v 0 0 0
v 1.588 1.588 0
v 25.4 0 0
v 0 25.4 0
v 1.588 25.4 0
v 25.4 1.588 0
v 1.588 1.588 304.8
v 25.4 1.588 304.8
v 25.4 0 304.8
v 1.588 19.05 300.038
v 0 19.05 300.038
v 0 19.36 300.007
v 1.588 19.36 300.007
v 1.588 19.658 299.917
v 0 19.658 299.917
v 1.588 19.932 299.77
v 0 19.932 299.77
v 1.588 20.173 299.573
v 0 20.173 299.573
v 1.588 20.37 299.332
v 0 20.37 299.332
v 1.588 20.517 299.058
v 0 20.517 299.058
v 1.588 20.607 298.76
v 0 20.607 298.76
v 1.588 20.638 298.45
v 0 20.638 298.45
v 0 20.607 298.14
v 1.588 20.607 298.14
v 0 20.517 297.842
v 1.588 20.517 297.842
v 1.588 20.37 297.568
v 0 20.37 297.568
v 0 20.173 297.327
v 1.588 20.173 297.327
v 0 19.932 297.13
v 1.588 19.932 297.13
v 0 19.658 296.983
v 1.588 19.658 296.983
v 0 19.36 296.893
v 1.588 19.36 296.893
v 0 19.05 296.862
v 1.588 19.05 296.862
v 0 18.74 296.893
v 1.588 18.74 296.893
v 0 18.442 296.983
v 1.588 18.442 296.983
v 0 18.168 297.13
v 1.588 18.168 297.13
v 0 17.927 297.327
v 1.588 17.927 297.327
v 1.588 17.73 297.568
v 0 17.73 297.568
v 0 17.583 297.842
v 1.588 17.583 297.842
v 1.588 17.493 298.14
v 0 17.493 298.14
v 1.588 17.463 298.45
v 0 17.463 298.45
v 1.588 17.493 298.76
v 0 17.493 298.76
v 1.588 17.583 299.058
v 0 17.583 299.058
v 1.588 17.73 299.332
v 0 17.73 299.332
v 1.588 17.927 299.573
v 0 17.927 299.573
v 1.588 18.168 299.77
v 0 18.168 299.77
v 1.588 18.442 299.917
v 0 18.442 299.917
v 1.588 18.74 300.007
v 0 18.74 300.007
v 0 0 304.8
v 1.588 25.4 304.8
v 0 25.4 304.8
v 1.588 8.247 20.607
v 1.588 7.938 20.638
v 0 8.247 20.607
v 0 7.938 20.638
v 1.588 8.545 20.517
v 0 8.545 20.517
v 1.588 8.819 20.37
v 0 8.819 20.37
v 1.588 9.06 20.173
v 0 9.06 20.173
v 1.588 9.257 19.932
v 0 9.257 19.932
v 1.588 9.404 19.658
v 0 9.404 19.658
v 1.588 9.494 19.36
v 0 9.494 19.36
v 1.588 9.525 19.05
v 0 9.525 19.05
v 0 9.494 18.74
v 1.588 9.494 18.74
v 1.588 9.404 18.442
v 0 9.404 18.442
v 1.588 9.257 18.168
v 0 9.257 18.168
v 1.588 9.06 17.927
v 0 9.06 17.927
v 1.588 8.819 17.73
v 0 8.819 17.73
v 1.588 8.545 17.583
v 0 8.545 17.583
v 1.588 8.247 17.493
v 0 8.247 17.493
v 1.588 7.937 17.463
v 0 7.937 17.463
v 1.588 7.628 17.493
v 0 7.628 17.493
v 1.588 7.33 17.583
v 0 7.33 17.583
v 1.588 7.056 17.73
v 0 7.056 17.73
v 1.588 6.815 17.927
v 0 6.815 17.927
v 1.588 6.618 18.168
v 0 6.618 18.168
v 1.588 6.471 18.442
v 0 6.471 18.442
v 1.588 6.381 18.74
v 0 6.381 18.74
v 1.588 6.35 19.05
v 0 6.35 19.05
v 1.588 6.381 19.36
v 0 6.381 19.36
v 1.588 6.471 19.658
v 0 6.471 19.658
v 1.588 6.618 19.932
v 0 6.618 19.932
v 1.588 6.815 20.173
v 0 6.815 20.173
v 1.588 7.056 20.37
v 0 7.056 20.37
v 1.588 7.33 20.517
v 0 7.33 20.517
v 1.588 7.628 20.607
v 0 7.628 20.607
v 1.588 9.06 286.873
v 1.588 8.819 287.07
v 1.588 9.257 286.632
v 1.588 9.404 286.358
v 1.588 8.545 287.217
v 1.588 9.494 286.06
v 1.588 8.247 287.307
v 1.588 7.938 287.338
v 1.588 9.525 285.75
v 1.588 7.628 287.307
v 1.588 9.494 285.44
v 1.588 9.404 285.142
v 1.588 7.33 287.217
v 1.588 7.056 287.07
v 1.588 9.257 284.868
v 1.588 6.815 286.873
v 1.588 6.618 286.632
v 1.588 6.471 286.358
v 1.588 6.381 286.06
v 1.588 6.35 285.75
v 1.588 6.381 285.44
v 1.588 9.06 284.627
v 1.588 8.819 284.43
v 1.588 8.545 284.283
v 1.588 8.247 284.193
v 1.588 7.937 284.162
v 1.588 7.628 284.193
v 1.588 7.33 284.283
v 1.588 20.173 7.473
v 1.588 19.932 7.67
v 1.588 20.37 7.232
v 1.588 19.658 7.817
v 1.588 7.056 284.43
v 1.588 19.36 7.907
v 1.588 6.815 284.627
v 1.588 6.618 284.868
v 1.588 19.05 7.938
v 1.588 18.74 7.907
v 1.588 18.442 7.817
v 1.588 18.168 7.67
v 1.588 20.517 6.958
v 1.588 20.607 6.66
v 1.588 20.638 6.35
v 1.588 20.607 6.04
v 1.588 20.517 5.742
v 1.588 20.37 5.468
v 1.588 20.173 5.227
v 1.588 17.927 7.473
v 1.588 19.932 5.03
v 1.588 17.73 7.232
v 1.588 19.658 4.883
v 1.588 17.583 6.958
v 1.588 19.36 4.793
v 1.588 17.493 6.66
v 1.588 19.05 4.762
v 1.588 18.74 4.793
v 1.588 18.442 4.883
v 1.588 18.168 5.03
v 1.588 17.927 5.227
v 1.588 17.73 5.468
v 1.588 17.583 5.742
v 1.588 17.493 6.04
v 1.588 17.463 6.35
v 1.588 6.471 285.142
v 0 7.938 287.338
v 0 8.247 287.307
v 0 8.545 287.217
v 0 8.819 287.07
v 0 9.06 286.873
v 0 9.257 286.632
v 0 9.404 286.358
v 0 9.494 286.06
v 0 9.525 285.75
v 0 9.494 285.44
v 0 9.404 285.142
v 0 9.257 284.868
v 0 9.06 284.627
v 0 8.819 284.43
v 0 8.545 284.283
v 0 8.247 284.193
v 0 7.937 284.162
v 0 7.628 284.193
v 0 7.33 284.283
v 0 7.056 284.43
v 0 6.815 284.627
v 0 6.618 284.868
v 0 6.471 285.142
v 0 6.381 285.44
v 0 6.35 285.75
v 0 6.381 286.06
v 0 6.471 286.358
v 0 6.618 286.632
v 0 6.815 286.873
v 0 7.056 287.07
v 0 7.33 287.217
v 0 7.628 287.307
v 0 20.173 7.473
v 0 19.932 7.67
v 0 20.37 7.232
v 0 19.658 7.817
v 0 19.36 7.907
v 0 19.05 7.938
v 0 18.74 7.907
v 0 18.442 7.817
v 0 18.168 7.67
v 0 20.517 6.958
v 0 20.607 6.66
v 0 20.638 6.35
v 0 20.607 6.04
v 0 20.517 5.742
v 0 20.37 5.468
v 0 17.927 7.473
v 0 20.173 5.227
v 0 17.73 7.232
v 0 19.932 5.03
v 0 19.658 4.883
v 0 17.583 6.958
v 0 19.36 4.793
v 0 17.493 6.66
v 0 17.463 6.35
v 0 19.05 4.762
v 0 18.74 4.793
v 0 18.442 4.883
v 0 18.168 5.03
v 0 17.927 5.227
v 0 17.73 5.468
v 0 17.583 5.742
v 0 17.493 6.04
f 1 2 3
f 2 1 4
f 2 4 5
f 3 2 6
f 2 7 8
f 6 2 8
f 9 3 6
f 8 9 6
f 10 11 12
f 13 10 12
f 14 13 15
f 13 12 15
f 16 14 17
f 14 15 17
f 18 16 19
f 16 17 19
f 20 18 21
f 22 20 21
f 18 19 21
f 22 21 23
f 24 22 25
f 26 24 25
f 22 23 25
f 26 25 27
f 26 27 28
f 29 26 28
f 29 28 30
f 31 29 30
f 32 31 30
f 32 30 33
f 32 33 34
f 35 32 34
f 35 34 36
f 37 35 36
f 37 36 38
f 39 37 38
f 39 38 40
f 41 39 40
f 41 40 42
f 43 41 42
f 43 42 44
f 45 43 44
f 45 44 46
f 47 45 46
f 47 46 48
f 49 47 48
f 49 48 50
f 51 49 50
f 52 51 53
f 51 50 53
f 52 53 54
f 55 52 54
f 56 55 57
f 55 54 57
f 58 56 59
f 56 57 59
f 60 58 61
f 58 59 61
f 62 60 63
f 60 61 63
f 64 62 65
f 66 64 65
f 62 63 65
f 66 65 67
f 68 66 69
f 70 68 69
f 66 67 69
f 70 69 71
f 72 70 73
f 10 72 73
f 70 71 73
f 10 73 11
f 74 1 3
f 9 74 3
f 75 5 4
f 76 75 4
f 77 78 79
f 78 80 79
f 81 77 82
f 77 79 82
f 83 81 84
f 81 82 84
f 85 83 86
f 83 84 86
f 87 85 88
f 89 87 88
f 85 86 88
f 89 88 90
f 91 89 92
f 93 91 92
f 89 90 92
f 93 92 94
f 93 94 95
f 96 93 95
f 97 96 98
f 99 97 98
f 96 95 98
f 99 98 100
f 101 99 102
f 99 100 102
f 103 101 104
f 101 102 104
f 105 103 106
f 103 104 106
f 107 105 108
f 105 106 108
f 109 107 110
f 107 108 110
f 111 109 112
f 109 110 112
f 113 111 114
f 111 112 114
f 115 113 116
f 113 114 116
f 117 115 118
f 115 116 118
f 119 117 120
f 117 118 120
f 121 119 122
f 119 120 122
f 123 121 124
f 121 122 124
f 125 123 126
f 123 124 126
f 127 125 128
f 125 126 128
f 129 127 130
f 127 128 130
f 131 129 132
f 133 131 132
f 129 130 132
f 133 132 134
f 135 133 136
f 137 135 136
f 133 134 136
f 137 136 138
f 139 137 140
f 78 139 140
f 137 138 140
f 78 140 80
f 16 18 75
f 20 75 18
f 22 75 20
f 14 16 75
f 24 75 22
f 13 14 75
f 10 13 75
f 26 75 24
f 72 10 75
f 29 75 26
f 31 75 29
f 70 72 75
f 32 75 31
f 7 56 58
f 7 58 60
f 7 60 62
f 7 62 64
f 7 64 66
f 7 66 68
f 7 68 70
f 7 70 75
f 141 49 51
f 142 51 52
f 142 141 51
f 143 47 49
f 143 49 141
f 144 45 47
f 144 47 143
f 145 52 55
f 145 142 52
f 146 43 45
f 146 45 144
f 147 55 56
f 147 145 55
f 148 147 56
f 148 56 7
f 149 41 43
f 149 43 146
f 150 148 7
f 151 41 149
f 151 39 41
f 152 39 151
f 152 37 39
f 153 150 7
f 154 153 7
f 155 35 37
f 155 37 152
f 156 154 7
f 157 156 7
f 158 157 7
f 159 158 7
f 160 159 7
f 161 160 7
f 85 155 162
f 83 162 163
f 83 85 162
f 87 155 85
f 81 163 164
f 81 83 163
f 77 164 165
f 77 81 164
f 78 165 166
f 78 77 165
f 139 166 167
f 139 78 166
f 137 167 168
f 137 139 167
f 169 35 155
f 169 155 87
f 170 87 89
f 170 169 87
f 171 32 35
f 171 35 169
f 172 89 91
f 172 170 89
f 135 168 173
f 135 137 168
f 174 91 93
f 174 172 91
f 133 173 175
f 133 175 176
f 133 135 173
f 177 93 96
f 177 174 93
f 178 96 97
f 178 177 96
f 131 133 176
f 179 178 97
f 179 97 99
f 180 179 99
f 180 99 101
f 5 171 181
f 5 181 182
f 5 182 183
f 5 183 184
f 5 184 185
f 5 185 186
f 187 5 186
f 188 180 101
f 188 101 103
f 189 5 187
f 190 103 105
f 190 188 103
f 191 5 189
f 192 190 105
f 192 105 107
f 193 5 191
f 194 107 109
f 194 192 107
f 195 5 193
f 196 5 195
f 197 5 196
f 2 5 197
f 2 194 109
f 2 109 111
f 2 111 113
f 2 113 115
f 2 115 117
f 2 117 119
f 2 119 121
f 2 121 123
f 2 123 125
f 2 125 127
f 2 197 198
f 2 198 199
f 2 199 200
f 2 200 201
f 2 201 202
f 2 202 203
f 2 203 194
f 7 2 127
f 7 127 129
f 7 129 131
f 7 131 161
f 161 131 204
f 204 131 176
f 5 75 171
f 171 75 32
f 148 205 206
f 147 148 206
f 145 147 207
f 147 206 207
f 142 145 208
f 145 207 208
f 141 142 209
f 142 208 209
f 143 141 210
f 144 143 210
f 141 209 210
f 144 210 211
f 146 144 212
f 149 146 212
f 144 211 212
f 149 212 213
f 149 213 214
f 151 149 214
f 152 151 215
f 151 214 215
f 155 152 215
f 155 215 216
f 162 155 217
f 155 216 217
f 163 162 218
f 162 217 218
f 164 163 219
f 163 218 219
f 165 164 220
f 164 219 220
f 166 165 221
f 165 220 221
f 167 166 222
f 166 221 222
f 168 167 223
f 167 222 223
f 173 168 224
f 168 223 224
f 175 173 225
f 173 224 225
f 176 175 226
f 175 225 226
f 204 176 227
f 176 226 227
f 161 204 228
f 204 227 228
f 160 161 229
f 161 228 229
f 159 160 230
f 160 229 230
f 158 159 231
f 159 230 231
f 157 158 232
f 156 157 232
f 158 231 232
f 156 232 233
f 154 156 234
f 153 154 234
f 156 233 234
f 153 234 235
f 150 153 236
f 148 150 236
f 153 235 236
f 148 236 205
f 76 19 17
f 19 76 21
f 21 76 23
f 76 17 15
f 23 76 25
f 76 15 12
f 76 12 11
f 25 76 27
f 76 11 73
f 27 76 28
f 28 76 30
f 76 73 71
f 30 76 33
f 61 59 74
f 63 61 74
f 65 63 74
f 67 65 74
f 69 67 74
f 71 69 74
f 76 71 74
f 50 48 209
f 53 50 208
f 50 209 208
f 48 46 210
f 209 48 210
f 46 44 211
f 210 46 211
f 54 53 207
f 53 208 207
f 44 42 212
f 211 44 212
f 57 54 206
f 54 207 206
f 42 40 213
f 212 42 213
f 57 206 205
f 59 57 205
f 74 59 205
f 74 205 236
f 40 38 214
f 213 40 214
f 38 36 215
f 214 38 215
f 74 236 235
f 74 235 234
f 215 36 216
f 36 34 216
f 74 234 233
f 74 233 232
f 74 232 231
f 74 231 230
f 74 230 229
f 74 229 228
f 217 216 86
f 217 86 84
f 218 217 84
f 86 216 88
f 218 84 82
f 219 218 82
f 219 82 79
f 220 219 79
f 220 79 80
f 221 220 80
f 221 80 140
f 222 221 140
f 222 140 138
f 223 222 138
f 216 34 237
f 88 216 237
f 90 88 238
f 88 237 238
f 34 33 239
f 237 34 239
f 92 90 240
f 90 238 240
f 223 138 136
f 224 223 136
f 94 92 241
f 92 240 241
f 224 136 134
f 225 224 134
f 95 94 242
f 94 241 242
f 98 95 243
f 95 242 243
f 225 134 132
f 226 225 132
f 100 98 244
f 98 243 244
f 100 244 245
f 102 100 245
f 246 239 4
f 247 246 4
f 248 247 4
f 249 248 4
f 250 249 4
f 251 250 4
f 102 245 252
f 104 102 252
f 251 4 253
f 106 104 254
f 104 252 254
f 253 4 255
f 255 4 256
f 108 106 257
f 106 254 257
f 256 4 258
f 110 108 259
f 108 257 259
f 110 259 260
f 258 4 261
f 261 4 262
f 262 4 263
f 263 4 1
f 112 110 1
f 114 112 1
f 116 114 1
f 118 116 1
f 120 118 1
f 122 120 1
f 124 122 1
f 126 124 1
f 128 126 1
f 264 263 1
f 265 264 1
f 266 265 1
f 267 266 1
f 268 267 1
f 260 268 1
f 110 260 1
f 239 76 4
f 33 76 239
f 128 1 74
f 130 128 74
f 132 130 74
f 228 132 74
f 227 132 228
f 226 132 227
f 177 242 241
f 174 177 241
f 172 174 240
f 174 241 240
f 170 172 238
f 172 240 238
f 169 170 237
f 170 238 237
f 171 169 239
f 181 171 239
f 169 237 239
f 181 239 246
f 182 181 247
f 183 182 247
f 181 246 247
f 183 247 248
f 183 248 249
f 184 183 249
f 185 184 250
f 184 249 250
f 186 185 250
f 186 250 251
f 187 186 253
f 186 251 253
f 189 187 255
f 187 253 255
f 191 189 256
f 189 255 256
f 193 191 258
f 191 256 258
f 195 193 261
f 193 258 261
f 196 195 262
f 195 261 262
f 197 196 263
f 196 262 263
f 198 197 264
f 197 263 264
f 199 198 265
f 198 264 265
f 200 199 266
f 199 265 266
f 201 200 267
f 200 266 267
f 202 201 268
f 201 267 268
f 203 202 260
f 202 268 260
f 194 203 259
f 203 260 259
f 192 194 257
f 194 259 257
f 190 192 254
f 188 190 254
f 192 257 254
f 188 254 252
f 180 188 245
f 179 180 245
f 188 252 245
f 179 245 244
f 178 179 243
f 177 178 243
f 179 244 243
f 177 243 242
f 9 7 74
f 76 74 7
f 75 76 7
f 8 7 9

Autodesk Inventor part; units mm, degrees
ref_plane "YZ Plane" through (0, 0, 0) normal (1, 0, 0) x (0, 1, 0)
ref_plane "XZ Plane" through (0, 0, 0) normal (0, 1, 0) x (-1, 0, 0)
ref_plane "XY Plane" through (0, 0, 0) normal (0, 0, 1) x (1, 0, 0)
sketch "Sketch1" plane through (0, 0, 0) normal (0, 0, 1) x (1, 0, 0)
  line L0 (0, 0) -> (25.4, 0)
  line L1 (25.4, 0) -> (25.4, 1.5875)
  line L2 (1.5875, 25.4) -> (0, 25.4)
  line L3 (0, 25.4) -> (0, 0)
  line L4 (1.5875, 25.4) -> (1.5875, 1.5875)
  line L5 (1.5875, 1.5875) -> (25.4, 1.5875)
  dimension "d0" = 25.4
  dimension "d1" = 25.4
  dimension "d2" = 1.5875
  dimension "d3" = 1.5875
extrude "Extrusion1" add sketch "Sketch1" along normal blind 304.8
sketch "Sketch3" plane through (0, 0, 0) normal (-1, 0, 0) x (0, 0, 1)
  line L0 (304.8, 0) -> (304.8, 25.4) projected
  line L1 (0, 25.4) -> (304.8, 25.4) projected
  line L2 (0, 0) -> (304.8, 0) projected
  circle A0 centre (298.45, 19.05) radius 1.5875
  circle A1 centre (285.75, 7.9375) radius 1.5875
  line L3 (152.4, 25.4) -> (152.4, 0) construction
  circle A2 centre (6.35, 19.05) radius 1.5875
  circle A3 centre (19.05, 7.9375) radius 1.5875
  dimension "d19" = 6.35
  dimension "d20" = 6.35
  dimension "d21" = 7.9375
  dimension "d22" = 19.05
  dimension "d23" = 3.175
extrude "Extrusion4" cut sketch "Sketch3" against normal blind 25.4
equation "\"d2\" = d3"
equation "\"d20\" = d19"
properties part number "8 ball front L"
